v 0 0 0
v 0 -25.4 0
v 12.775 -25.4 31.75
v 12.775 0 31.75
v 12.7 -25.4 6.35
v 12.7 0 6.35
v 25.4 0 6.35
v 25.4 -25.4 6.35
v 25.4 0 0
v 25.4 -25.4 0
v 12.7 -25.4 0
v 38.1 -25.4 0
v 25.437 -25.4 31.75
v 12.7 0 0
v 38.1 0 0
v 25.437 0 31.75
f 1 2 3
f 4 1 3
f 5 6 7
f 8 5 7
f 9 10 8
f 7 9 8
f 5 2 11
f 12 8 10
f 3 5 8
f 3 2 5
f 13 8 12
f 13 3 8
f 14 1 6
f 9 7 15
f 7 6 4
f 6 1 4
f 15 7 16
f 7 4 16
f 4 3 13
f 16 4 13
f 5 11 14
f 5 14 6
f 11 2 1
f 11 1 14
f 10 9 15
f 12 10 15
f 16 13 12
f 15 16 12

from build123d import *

# Parameters (mm, degrees)
F0_W      = 38.1
F0_H      = 31.75
F2_DEPTH  = 25.4
F7_W      = 12.7
F7_H      = 6.35
F8_DEPTH  = 25.4
F10_DEPTH = 25.4
F12_DEPTH = 25.4


# Not quite as in the source:
# - the program builds the solid bodies; features that only make, move or delete a surface that nothing else refers to are left out


with BuildPart() as f2:
    # F0 (on Front) → F2 (new body)
    with BuildSketch(Plane.XZ):
        with Locations((19.05, 15.875)):
            Rectangle(F0_W, F0_H)
    extrude(amount=F2_DEPTH)

    # F7 (on face) → F8 (cut)
    with BuildSketch(Plane.XZ.offset(25.4)):
        with Locations((19.05, 3.175)):
            Rectangle(F7_W, F7_H)
    extrude(amount=-F8_DEPTH, mode=Mode.SUBTRACT)

    # F9 (on face) → F10 (cut)
    with BuildSketch(Plane.XZ.offset(25.4)):
        Polygon((0, 31.75), (0, 0), (12.7748493105, 31.75), align=None)
    extrude(amount=-F10_DEPTH, mode=Mode.SUBTRACT)

    # F11 (on face) → F12 (cut)
    with BuildSketch(Plane.XZ.offset(25.4)):
        Polygon((25.4374246553, 31.75), (38.1, 0), (38.1, 31.75), align=None)
    extrude(amount=-F12_DEPTH, mode=Mode.SUBTRACT)


solid = f2.part
